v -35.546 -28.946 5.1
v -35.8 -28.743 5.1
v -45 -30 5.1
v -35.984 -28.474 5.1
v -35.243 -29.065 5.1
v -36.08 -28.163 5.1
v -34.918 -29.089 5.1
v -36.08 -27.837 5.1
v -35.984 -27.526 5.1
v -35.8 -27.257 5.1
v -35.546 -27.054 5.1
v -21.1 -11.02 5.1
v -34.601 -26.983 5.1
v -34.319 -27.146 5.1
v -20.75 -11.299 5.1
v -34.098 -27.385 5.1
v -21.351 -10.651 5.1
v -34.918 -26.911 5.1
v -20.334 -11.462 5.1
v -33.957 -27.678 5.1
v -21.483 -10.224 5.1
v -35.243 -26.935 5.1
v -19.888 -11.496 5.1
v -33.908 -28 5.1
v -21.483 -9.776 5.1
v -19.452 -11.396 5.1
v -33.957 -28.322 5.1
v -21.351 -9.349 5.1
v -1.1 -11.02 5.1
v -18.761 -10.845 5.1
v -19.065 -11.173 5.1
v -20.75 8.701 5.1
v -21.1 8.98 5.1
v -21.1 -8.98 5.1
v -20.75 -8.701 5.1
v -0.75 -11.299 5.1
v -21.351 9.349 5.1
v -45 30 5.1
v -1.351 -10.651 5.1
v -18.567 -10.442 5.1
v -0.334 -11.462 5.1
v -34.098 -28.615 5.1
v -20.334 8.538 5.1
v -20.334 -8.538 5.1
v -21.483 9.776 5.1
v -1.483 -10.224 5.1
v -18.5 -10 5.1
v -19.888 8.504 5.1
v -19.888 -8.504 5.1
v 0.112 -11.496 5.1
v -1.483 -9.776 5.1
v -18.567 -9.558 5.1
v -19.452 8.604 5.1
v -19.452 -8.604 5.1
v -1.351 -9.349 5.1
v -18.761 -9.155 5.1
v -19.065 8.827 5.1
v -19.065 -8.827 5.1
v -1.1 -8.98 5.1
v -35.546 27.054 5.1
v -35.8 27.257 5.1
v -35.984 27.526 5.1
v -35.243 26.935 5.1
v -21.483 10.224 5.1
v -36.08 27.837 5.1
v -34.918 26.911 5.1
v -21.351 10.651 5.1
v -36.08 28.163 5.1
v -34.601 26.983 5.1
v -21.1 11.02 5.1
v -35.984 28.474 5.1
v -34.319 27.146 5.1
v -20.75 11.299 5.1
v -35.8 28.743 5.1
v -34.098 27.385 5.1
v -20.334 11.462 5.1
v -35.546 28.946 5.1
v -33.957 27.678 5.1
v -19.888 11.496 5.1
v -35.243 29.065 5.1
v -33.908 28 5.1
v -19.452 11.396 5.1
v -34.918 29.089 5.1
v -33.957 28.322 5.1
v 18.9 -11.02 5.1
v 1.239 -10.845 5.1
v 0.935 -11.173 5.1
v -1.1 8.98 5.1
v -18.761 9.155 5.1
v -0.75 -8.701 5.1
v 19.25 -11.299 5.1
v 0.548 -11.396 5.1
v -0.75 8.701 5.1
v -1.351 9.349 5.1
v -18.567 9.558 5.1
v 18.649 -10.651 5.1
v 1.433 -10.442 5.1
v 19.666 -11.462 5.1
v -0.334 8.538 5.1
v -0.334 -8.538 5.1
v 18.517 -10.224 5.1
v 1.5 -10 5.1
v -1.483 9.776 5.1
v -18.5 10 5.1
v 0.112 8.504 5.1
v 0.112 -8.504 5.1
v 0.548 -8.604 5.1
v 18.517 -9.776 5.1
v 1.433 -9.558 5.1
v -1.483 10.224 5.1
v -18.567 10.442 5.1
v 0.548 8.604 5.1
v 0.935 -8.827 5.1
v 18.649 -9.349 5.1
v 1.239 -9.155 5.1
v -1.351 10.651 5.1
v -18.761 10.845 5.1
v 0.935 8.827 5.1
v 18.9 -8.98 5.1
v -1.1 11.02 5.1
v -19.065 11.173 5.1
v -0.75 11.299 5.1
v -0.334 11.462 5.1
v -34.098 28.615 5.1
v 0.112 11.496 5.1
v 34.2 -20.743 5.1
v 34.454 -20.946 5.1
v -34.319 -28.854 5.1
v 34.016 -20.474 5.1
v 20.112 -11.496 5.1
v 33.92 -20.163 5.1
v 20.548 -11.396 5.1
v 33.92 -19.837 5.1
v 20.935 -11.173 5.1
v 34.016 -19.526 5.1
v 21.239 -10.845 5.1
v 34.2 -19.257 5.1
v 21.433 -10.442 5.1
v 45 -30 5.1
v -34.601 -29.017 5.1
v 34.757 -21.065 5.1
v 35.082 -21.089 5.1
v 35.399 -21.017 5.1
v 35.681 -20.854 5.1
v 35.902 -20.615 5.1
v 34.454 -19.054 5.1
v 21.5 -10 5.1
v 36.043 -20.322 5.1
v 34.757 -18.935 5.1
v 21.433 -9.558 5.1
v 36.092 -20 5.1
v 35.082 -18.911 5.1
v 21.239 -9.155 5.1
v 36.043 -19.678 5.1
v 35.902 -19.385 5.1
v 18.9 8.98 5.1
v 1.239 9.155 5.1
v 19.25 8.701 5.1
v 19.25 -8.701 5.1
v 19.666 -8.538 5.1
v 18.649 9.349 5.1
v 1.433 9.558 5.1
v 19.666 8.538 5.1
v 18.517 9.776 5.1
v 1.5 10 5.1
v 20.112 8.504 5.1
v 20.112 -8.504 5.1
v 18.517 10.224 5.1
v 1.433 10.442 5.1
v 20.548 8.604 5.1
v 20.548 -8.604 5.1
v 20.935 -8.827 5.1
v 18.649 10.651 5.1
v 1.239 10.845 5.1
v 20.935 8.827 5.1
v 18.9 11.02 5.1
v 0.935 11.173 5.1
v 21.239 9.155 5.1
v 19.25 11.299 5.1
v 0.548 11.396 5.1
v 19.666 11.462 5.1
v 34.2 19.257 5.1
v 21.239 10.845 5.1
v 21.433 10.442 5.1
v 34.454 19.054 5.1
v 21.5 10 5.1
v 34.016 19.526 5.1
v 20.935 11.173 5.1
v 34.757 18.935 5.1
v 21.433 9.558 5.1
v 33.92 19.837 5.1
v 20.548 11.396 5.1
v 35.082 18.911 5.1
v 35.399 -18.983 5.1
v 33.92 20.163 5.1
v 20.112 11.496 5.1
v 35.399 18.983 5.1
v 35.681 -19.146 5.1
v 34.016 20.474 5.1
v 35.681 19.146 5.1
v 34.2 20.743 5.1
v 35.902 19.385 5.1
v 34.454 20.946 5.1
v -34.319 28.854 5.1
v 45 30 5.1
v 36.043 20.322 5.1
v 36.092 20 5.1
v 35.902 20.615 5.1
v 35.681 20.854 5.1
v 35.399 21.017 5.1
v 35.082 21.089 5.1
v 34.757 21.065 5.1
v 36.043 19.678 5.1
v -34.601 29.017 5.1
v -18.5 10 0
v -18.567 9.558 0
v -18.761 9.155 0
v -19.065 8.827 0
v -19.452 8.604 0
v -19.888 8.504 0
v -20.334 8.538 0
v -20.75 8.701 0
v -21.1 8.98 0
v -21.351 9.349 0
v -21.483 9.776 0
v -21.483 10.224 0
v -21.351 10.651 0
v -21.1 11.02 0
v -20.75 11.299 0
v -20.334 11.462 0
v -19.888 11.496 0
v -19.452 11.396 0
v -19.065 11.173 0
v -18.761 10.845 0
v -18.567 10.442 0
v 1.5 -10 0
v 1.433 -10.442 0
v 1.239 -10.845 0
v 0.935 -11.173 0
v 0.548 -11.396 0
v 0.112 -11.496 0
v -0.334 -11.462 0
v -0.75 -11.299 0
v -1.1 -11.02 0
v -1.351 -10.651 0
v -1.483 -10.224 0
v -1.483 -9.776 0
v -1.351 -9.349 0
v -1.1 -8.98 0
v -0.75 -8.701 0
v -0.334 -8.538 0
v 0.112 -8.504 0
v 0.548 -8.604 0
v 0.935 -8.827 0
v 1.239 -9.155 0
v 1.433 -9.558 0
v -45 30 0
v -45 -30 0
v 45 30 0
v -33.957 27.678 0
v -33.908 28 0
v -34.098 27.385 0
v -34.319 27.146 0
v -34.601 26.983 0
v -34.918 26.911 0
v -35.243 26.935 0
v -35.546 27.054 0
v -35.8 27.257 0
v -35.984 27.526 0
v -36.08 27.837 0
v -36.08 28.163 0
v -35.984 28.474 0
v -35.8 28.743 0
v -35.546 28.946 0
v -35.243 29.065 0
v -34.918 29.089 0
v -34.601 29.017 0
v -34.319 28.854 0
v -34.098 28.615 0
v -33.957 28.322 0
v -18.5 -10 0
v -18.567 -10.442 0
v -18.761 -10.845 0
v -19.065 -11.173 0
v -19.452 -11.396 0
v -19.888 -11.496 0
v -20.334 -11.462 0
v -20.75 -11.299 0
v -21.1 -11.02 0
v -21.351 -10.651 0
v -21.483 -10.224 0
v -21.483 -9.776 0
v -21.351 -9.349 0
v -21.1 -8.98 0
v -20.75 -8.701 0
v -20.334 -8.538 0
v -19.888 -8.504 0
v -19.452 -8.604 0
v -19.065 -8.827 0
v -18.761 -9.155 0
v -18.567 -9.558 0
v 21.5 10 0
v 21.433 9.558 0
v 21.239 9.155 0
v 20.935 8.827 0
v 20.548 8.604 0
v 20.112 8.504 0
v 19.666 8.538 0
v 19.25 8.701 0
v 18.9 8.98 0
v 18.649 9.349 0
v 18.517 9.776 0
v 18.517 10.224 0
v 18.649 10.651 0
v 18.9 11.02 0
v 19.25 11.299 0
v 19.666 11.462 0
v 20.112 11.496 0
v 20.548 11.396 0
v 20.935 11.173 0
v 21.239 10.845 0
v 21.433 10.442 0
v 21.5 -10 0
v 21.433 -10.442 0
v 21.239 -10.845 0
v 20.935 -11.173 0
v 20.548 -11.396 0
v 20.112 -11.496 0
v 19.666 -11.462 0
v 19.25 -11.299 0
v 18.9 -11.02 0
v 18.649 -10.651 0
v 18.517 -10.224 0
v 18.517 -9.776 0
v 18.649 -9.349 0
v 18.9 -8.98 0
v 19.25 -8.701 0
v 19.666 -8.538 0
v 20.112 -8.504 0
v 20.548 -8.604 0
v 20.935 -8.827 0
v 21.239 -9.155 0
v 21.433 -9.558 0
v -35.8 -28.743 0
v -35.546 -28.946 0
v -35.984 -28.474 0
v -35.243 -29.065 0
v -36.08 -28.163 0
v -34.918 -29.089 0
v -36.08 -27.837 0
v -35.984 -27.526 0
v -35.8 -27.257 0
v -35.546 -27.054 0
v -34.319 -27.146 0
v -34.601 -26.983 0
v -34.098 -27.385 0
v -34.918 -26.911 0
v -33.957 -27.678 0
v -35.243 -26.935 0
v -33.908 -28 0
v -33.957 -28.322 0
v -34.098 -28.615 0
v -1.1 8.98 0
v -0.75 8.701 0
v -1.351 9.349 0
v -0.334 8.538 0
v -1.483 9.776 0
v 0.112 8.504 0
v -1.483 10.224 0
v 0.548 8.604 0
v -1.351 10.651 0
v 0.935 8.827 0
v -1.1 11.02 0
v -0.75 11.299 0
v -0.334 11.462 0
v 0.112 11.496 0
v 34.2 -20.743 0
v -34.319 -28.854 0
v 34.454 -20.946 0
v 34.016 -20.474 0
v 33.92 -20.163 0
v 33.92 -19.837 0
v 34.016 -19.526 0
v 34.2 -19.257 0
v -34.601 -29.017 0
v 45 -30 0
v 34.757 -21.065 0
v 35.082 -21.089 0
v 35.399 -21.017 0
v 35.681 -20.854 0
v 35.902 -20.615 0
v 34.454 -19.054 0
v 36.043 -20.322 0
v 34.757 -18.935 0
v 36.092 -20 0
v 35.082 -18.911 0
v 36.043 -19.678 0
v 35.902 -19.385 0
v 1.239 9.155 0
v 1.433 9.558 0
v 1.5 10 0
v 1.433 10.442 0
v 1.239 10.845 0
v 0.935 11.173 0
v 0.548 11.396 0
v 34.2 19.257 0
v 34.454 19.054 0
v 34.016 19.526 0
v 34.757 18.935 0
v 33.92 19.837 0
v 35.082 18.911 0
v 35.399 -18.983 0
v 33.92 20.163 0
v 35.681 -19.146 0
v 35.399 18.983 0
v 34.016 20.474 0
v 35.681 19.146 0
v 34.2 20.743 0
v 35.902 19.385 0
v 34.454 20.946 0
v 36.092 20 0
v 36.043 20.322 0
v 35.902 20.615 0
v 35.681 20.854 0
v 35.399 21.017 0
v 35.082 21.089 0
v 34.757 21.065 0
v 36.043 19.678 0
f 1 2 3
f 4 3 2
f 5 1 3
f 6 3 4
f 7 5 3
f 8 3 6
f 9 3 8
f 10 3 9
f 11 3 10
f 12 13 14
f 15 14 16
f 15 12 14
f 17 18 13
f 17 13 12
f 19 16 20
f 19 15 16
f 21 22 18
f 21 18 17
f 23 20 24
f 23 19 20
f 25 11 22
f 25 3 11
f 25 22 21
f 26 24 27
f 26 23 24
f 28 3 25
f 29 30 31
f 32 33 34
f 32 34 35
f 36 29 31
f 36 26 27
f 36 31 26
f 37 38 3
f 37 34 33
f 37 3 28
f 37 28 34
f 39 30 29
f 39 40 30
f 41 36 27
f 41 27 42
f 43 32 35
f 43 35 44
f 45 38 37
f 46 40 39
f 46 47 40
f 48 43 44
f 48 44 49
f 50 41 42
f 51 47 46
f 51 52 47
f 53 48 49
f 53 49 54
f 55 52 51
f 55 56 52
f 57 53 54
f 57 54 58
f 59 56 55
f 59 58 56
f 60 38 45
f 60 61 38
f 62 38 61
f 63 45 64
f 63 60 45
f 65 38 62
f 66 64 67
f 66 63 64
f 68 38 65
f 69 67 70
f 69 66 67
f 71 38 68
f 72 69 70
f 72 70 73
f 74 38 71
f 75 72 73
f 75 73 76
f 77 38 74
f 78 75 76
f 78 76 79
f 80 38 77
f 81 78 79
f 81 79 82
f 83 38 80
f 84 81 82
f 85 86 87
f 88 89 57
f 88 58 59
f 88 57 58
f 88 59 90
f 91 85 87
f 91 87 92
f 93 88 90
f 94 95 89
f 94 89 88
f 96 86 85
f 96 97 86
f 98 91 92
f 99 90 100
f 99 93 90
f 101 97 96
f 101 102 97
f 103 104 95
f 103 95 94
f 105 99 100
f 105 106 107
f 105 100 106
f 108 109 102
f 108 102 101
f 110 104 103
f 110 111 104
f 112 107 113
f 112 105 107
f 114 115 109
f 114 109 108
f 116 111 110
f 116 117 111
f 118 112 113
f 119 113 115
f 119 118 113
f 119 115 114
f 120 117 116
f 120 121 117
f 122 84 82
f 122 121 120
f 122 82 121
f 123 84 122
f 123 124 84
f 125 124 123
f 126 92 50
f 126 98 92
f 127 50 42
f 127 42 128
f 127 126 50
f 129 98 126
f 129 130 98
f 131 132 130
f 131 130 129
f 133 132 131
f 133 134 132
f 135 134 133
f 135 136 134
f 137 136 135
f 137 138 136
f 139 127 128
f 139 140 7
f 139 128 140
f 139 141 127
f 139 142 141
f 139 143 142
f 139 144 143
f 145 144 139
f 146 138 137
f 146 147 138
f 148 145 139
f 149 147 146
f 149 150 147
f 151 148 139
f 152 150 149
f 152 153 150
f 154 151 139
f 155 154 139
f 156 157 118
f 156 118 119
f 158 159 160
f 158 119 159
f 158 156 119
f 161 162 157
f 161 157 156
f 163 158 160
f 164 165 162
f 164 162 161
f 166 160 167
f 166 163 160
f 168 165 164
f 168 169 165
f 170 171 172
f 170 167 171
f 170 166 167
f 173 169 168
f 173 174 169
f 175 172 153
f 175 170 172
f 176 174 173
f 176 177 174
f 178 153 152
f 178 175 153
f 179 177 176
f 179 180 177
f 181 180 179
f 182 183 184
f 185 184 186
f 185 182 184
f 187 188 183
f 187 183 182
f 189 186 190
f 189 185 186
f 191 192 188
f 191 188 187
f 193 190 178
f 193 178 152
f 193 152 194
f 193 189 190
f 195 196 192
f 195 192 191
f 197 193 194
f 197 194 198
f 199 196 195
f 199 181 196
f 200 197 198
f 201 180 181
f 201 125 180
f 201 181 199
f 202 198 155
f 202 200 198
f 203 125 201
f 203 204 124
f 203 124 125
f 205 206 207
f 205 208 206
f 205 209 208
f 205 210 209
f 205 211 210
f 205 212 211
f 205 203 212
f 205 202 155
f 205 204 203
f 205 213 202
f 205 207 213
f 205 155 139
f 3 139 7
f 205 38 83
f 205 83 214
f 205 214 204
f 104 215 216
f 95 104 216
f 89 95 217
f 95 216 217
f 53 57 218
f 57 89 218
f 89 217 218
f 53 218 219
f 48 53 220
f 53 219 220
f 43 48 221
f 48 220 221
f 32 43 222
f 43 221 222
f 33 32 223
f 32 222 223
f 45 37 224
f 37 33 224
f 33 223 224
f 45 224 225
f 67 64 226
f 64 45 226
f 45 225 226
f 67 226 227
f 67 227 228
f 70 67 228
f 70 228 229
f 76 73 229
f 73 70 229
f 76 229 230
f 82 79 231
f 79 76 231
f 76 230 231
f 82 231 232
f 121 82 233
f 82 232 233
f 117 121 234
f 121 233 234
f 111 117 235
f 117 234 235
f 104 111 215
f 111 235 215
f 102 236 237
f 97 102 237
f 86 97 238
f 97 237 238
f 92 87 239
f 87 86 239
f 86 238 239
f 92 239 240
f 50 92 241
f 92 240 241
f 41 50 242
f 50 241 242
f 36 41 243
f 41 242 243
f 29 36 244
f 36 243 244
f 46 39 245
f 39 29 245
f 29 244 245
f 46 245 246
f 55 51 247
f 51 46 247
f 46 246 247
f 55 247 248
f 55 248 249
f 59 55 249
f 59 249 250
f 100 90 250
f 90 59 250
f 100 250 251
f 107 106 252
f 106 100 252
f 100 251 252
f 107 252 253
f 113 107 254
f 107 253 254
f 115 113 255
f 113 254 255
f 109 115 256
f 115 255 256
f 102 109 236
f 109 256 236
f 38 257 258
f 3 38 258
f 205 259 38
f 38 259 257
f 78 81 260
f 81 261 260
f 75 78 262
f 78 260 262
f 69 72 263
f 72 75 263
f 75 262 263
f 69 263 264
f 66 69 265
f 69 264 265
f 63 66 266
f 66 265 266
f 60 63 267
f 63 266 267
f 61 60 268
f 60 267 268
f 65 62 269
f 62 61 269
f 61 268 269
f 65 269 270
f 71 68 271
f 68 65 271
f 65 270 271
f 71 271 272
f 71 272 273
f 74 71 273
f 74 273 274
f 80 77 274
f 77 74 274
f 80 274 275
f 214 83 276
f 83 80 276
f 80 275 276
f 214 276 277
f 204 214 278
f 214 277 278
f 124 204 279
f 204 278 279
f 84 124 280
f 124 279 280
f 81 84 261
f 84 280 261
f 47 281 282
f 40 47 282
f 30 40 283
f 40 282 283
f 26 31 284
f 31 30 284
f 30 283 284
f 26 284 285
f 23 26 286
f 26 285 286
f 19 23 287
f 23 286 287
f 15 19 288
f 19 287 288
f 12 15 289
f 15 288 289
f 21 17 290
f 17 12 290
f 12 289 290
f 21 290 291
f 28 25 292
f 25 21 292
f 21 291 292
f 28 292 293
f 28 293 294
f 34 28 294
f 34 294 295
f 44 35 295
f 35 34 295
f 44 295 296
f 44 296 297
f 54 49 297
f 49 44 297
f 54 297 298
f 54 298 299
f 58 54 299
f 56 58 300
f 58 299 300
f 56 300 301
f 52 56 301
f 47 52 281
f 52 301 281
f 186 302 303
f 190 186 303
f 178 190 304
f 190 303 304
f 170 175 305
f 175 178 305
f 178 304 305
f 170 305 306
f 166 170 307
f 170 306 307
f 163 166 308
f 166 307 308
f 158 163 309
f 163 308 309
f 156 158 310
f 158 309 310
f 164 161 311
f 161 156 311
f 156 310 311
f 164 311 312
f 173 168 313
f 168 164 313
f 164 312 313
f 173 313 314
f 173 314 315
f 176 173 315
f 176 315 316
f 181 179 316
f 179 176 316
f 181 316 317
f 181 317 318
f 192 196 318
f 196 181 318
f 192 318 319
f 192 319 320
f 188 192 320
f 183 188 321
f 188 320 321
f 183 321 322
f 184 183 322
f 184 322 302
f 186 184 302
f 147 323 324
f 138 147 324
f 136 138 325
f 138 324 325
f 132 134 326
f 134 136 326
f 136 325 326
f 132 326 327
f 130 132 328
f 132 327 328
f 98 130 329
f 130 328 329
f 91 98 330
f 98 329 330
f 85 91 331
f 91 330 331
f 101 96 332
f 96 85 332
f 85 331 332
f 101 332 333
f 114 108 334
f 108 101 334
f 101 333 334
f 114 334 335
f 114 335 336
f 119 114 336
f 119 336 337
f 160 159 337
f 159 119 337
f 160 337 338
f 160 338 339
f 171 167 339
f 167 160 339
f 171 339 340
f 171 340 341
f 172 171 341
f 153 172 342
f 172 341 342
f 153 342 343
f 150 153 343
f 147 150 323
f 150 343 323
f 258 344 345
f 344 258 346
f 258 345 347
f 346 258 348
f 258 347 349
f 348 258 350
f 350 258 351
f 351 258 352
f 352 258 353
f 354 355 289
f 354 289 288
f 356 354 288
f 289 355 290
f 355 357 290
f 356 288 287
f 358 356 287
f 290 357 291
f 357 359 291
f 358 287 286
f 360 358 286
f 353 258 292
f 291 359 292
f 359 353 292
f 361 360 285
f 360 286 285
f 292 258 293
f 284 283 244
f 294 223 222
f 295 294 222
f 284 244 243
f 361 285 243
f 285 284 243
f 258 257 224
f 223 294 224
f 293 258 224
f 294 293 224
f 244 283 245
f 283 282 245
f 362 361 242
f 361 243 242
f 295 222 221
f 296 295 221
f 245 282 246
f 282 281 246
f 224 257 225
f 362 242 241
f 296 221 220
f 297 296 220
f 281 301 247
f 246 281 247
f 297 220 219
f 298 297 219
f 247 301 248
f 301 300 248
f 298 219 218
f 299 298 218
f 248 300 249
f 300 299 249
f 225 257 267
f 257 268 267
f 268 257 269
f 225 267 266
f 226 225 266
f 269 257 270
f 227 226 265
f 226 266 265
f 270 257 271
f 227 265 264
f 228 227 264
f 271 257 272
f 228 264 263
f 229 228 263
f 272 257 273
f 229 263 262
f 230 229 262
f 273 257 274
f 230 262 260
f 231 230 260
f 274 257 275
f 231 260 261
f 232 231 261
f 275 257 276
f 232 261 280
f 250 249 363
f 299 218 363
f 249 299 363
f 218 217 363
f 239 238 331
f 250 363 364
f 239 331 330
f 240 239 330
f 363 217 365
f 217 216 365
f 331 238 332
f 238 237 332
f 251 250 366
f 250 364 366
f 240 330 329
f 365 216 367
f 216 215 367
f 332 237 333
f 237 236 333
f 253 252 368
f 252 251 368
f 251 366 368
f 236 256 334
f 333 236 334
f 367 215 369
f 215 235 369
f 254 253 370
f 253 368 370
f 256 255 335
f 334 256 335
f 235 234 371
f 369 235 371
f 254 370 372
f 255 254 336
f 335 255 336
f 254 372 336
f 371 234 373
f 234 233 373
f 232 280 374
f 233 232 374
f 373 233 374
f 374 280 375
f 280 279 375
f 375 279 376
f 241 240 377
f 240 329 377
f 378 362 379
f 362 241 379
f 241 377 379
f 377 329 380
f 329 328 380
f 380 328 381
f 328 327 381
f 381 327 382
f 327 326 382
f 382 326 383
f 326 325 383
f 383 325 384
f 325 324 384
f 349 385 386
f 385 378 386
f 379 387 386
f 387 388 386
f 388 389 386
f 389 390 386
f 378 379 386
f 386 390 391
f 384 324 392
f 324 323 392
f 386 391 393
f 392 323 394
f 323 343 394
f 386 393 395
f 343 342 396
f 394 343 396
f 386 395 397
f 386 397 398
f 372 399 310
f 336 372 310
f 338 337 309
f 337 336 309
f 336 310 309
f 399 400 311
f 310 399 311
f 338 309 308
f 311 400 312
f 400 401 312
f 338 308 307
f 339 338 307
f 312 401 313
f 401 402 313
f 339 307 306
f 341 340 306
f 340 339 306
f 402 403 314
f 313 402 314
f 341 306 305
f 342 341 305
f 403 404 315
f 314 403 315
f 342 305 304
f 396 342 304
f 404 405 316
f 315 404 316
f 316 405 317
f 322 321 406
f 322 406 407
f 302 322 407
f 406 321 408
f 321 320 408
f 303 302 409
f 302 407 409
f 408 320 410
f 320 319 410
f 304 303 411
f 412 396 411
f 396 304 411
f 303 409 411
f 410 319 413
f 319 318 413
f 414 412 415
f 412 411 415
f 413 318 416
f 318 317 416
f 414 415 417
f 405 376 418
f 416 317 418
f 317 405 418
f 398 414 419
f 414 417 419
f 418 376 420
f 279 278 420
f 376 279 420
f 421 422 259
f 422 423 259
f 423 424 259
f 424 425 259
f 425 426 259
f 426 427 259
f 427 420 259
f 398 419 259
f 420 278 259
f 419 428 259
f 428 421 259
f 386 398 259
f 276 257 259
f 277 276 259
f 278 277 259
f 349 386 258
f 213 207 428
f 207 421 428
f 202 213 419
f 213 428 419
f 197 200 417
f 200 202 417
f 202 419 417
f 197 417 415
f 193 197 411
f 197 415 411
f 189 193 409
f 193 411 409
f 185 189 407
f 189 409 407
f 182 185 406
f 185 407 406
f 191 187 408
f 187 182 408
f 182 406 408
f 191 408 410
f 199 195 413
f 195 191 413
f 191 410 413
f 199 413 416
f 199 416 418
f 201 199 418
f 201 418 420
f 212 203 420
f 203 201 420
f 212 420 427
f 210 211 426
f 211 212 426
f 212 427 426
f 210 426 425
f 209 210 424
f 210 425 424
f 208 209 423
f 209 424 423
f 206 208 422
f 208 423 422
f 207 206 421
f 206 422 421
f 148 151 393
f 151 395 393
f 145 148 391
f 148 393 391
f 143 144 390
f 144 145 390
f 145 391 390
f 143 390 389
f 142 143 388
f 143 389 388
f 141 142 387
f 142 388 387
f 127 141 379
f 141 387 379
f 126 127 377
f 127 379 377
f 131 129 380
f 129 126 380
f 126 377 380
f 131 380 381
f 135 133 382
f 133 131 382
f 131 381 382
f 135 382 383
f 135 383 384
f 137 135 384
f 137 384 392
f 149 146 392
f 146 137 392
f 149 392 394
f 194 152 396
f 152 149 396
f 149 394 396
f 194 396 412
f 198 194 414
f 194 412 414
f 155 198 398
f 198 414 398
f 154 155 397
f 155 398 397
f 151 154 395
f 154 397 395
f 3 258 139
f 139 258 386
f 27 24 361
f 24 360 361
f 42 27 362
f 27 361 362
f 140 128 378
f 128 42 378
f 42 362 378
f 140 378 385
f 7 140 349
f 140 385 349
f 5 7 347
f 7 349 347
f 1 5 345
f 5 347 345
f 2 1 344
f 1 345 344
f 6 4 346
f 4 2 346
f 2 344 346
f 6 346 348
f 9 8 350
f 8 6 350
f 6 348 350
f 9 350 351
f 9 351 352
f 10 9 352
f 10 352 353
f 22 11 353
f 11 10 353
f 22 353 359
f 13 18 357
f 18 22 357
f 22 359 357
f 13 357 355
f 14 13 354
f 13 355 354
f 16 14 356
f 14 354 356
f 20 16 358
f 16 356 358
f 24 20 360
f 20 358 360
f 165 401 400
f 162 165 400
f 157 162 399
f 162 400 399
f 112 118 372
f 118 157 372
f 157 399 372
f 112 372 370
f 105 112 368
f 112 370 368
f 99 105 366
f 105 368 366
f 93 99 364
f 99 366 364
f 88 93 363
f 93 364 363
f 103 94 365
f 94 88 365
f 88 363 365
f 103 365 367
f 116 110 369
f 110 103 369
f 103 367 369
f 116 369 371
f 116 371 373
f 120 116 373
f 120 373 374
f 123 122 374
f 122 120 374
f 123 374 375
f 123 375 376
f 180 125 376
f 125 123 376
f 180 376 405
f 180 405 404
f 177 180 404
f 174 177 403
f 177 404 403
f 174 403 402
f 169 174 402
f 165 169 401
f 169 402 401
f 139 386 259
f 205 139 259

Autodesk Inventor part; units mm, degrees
ref_plane "YZ Plane" through (0, 0, 0) normal (1, 0, 0) x (0, 1, 0)
ref_plane "XZ Plane" through (0, 0, 0) normal (0, 1, 0) x (-1, 0, 0)
ref_plane "XY Plane" through (0, 0, 0) normal (0, 0, 1) x (1, 0, 0)
sketch "Sketch1" plane through (0, 0, 0) normal (0, 0, 1) x (1, 0, 0)
  line L0 (-45, -30) -> (45, -30)
  line L1 (45, -30) -> (45, 30)
  line L2 (45, 30) -> (-45, 30)
  line L3 (-45, 30) -> (-45, -30)
  line L4 (-45, -30) -> (45, 30) construction
  line L5 (45, -30) -> (-45, 30) construction
  circle A0 centre (-35, -28) radius 1.092
  circle A1 centre (35, -20) radius 1.092
  line L6 (0, 0) -> (14.1537, 0) construction
  circle A2 centre (-35, 28) radius 1.092
  circle A3 centre (35, 20) radius 1.092
  circle A4 centre (-20, 10) radius 1.5
  circle A5 centre (0, 10) radius 1.5
  circle A6 centre (20, 10) radius 1.5
  circle A7 centre (-20, -10) radius 1.5
  circle A8 centre (0, -10) radius 1.5
  circle A9 centre (20, -10) radius 1.5
  dimension "d0" = 90
  dimension "d1" = 60
  dimension "d7" = 2.184
  dimension "d8" = 2.184
  dimension "d11" = 2
  dimension "d19" = 70
  dimension "d22" = 10
  dimension "d23" = 10
  dimension "d24" = 3
  dimension "d25" = 3
  dimension "d26" = 3
  dimension "d27" = 3
  dimension "d28" = 3
  dimension "d29" = 3
  dimension "d30" = 10
  dimension "d31" = 10
  dimension "d32" = 20
  dimension "d33" = 20
extrude "Extrusion1" add sketch "Sketch1" along normal blind 5.1
properties part number "lidar mounting plate"
